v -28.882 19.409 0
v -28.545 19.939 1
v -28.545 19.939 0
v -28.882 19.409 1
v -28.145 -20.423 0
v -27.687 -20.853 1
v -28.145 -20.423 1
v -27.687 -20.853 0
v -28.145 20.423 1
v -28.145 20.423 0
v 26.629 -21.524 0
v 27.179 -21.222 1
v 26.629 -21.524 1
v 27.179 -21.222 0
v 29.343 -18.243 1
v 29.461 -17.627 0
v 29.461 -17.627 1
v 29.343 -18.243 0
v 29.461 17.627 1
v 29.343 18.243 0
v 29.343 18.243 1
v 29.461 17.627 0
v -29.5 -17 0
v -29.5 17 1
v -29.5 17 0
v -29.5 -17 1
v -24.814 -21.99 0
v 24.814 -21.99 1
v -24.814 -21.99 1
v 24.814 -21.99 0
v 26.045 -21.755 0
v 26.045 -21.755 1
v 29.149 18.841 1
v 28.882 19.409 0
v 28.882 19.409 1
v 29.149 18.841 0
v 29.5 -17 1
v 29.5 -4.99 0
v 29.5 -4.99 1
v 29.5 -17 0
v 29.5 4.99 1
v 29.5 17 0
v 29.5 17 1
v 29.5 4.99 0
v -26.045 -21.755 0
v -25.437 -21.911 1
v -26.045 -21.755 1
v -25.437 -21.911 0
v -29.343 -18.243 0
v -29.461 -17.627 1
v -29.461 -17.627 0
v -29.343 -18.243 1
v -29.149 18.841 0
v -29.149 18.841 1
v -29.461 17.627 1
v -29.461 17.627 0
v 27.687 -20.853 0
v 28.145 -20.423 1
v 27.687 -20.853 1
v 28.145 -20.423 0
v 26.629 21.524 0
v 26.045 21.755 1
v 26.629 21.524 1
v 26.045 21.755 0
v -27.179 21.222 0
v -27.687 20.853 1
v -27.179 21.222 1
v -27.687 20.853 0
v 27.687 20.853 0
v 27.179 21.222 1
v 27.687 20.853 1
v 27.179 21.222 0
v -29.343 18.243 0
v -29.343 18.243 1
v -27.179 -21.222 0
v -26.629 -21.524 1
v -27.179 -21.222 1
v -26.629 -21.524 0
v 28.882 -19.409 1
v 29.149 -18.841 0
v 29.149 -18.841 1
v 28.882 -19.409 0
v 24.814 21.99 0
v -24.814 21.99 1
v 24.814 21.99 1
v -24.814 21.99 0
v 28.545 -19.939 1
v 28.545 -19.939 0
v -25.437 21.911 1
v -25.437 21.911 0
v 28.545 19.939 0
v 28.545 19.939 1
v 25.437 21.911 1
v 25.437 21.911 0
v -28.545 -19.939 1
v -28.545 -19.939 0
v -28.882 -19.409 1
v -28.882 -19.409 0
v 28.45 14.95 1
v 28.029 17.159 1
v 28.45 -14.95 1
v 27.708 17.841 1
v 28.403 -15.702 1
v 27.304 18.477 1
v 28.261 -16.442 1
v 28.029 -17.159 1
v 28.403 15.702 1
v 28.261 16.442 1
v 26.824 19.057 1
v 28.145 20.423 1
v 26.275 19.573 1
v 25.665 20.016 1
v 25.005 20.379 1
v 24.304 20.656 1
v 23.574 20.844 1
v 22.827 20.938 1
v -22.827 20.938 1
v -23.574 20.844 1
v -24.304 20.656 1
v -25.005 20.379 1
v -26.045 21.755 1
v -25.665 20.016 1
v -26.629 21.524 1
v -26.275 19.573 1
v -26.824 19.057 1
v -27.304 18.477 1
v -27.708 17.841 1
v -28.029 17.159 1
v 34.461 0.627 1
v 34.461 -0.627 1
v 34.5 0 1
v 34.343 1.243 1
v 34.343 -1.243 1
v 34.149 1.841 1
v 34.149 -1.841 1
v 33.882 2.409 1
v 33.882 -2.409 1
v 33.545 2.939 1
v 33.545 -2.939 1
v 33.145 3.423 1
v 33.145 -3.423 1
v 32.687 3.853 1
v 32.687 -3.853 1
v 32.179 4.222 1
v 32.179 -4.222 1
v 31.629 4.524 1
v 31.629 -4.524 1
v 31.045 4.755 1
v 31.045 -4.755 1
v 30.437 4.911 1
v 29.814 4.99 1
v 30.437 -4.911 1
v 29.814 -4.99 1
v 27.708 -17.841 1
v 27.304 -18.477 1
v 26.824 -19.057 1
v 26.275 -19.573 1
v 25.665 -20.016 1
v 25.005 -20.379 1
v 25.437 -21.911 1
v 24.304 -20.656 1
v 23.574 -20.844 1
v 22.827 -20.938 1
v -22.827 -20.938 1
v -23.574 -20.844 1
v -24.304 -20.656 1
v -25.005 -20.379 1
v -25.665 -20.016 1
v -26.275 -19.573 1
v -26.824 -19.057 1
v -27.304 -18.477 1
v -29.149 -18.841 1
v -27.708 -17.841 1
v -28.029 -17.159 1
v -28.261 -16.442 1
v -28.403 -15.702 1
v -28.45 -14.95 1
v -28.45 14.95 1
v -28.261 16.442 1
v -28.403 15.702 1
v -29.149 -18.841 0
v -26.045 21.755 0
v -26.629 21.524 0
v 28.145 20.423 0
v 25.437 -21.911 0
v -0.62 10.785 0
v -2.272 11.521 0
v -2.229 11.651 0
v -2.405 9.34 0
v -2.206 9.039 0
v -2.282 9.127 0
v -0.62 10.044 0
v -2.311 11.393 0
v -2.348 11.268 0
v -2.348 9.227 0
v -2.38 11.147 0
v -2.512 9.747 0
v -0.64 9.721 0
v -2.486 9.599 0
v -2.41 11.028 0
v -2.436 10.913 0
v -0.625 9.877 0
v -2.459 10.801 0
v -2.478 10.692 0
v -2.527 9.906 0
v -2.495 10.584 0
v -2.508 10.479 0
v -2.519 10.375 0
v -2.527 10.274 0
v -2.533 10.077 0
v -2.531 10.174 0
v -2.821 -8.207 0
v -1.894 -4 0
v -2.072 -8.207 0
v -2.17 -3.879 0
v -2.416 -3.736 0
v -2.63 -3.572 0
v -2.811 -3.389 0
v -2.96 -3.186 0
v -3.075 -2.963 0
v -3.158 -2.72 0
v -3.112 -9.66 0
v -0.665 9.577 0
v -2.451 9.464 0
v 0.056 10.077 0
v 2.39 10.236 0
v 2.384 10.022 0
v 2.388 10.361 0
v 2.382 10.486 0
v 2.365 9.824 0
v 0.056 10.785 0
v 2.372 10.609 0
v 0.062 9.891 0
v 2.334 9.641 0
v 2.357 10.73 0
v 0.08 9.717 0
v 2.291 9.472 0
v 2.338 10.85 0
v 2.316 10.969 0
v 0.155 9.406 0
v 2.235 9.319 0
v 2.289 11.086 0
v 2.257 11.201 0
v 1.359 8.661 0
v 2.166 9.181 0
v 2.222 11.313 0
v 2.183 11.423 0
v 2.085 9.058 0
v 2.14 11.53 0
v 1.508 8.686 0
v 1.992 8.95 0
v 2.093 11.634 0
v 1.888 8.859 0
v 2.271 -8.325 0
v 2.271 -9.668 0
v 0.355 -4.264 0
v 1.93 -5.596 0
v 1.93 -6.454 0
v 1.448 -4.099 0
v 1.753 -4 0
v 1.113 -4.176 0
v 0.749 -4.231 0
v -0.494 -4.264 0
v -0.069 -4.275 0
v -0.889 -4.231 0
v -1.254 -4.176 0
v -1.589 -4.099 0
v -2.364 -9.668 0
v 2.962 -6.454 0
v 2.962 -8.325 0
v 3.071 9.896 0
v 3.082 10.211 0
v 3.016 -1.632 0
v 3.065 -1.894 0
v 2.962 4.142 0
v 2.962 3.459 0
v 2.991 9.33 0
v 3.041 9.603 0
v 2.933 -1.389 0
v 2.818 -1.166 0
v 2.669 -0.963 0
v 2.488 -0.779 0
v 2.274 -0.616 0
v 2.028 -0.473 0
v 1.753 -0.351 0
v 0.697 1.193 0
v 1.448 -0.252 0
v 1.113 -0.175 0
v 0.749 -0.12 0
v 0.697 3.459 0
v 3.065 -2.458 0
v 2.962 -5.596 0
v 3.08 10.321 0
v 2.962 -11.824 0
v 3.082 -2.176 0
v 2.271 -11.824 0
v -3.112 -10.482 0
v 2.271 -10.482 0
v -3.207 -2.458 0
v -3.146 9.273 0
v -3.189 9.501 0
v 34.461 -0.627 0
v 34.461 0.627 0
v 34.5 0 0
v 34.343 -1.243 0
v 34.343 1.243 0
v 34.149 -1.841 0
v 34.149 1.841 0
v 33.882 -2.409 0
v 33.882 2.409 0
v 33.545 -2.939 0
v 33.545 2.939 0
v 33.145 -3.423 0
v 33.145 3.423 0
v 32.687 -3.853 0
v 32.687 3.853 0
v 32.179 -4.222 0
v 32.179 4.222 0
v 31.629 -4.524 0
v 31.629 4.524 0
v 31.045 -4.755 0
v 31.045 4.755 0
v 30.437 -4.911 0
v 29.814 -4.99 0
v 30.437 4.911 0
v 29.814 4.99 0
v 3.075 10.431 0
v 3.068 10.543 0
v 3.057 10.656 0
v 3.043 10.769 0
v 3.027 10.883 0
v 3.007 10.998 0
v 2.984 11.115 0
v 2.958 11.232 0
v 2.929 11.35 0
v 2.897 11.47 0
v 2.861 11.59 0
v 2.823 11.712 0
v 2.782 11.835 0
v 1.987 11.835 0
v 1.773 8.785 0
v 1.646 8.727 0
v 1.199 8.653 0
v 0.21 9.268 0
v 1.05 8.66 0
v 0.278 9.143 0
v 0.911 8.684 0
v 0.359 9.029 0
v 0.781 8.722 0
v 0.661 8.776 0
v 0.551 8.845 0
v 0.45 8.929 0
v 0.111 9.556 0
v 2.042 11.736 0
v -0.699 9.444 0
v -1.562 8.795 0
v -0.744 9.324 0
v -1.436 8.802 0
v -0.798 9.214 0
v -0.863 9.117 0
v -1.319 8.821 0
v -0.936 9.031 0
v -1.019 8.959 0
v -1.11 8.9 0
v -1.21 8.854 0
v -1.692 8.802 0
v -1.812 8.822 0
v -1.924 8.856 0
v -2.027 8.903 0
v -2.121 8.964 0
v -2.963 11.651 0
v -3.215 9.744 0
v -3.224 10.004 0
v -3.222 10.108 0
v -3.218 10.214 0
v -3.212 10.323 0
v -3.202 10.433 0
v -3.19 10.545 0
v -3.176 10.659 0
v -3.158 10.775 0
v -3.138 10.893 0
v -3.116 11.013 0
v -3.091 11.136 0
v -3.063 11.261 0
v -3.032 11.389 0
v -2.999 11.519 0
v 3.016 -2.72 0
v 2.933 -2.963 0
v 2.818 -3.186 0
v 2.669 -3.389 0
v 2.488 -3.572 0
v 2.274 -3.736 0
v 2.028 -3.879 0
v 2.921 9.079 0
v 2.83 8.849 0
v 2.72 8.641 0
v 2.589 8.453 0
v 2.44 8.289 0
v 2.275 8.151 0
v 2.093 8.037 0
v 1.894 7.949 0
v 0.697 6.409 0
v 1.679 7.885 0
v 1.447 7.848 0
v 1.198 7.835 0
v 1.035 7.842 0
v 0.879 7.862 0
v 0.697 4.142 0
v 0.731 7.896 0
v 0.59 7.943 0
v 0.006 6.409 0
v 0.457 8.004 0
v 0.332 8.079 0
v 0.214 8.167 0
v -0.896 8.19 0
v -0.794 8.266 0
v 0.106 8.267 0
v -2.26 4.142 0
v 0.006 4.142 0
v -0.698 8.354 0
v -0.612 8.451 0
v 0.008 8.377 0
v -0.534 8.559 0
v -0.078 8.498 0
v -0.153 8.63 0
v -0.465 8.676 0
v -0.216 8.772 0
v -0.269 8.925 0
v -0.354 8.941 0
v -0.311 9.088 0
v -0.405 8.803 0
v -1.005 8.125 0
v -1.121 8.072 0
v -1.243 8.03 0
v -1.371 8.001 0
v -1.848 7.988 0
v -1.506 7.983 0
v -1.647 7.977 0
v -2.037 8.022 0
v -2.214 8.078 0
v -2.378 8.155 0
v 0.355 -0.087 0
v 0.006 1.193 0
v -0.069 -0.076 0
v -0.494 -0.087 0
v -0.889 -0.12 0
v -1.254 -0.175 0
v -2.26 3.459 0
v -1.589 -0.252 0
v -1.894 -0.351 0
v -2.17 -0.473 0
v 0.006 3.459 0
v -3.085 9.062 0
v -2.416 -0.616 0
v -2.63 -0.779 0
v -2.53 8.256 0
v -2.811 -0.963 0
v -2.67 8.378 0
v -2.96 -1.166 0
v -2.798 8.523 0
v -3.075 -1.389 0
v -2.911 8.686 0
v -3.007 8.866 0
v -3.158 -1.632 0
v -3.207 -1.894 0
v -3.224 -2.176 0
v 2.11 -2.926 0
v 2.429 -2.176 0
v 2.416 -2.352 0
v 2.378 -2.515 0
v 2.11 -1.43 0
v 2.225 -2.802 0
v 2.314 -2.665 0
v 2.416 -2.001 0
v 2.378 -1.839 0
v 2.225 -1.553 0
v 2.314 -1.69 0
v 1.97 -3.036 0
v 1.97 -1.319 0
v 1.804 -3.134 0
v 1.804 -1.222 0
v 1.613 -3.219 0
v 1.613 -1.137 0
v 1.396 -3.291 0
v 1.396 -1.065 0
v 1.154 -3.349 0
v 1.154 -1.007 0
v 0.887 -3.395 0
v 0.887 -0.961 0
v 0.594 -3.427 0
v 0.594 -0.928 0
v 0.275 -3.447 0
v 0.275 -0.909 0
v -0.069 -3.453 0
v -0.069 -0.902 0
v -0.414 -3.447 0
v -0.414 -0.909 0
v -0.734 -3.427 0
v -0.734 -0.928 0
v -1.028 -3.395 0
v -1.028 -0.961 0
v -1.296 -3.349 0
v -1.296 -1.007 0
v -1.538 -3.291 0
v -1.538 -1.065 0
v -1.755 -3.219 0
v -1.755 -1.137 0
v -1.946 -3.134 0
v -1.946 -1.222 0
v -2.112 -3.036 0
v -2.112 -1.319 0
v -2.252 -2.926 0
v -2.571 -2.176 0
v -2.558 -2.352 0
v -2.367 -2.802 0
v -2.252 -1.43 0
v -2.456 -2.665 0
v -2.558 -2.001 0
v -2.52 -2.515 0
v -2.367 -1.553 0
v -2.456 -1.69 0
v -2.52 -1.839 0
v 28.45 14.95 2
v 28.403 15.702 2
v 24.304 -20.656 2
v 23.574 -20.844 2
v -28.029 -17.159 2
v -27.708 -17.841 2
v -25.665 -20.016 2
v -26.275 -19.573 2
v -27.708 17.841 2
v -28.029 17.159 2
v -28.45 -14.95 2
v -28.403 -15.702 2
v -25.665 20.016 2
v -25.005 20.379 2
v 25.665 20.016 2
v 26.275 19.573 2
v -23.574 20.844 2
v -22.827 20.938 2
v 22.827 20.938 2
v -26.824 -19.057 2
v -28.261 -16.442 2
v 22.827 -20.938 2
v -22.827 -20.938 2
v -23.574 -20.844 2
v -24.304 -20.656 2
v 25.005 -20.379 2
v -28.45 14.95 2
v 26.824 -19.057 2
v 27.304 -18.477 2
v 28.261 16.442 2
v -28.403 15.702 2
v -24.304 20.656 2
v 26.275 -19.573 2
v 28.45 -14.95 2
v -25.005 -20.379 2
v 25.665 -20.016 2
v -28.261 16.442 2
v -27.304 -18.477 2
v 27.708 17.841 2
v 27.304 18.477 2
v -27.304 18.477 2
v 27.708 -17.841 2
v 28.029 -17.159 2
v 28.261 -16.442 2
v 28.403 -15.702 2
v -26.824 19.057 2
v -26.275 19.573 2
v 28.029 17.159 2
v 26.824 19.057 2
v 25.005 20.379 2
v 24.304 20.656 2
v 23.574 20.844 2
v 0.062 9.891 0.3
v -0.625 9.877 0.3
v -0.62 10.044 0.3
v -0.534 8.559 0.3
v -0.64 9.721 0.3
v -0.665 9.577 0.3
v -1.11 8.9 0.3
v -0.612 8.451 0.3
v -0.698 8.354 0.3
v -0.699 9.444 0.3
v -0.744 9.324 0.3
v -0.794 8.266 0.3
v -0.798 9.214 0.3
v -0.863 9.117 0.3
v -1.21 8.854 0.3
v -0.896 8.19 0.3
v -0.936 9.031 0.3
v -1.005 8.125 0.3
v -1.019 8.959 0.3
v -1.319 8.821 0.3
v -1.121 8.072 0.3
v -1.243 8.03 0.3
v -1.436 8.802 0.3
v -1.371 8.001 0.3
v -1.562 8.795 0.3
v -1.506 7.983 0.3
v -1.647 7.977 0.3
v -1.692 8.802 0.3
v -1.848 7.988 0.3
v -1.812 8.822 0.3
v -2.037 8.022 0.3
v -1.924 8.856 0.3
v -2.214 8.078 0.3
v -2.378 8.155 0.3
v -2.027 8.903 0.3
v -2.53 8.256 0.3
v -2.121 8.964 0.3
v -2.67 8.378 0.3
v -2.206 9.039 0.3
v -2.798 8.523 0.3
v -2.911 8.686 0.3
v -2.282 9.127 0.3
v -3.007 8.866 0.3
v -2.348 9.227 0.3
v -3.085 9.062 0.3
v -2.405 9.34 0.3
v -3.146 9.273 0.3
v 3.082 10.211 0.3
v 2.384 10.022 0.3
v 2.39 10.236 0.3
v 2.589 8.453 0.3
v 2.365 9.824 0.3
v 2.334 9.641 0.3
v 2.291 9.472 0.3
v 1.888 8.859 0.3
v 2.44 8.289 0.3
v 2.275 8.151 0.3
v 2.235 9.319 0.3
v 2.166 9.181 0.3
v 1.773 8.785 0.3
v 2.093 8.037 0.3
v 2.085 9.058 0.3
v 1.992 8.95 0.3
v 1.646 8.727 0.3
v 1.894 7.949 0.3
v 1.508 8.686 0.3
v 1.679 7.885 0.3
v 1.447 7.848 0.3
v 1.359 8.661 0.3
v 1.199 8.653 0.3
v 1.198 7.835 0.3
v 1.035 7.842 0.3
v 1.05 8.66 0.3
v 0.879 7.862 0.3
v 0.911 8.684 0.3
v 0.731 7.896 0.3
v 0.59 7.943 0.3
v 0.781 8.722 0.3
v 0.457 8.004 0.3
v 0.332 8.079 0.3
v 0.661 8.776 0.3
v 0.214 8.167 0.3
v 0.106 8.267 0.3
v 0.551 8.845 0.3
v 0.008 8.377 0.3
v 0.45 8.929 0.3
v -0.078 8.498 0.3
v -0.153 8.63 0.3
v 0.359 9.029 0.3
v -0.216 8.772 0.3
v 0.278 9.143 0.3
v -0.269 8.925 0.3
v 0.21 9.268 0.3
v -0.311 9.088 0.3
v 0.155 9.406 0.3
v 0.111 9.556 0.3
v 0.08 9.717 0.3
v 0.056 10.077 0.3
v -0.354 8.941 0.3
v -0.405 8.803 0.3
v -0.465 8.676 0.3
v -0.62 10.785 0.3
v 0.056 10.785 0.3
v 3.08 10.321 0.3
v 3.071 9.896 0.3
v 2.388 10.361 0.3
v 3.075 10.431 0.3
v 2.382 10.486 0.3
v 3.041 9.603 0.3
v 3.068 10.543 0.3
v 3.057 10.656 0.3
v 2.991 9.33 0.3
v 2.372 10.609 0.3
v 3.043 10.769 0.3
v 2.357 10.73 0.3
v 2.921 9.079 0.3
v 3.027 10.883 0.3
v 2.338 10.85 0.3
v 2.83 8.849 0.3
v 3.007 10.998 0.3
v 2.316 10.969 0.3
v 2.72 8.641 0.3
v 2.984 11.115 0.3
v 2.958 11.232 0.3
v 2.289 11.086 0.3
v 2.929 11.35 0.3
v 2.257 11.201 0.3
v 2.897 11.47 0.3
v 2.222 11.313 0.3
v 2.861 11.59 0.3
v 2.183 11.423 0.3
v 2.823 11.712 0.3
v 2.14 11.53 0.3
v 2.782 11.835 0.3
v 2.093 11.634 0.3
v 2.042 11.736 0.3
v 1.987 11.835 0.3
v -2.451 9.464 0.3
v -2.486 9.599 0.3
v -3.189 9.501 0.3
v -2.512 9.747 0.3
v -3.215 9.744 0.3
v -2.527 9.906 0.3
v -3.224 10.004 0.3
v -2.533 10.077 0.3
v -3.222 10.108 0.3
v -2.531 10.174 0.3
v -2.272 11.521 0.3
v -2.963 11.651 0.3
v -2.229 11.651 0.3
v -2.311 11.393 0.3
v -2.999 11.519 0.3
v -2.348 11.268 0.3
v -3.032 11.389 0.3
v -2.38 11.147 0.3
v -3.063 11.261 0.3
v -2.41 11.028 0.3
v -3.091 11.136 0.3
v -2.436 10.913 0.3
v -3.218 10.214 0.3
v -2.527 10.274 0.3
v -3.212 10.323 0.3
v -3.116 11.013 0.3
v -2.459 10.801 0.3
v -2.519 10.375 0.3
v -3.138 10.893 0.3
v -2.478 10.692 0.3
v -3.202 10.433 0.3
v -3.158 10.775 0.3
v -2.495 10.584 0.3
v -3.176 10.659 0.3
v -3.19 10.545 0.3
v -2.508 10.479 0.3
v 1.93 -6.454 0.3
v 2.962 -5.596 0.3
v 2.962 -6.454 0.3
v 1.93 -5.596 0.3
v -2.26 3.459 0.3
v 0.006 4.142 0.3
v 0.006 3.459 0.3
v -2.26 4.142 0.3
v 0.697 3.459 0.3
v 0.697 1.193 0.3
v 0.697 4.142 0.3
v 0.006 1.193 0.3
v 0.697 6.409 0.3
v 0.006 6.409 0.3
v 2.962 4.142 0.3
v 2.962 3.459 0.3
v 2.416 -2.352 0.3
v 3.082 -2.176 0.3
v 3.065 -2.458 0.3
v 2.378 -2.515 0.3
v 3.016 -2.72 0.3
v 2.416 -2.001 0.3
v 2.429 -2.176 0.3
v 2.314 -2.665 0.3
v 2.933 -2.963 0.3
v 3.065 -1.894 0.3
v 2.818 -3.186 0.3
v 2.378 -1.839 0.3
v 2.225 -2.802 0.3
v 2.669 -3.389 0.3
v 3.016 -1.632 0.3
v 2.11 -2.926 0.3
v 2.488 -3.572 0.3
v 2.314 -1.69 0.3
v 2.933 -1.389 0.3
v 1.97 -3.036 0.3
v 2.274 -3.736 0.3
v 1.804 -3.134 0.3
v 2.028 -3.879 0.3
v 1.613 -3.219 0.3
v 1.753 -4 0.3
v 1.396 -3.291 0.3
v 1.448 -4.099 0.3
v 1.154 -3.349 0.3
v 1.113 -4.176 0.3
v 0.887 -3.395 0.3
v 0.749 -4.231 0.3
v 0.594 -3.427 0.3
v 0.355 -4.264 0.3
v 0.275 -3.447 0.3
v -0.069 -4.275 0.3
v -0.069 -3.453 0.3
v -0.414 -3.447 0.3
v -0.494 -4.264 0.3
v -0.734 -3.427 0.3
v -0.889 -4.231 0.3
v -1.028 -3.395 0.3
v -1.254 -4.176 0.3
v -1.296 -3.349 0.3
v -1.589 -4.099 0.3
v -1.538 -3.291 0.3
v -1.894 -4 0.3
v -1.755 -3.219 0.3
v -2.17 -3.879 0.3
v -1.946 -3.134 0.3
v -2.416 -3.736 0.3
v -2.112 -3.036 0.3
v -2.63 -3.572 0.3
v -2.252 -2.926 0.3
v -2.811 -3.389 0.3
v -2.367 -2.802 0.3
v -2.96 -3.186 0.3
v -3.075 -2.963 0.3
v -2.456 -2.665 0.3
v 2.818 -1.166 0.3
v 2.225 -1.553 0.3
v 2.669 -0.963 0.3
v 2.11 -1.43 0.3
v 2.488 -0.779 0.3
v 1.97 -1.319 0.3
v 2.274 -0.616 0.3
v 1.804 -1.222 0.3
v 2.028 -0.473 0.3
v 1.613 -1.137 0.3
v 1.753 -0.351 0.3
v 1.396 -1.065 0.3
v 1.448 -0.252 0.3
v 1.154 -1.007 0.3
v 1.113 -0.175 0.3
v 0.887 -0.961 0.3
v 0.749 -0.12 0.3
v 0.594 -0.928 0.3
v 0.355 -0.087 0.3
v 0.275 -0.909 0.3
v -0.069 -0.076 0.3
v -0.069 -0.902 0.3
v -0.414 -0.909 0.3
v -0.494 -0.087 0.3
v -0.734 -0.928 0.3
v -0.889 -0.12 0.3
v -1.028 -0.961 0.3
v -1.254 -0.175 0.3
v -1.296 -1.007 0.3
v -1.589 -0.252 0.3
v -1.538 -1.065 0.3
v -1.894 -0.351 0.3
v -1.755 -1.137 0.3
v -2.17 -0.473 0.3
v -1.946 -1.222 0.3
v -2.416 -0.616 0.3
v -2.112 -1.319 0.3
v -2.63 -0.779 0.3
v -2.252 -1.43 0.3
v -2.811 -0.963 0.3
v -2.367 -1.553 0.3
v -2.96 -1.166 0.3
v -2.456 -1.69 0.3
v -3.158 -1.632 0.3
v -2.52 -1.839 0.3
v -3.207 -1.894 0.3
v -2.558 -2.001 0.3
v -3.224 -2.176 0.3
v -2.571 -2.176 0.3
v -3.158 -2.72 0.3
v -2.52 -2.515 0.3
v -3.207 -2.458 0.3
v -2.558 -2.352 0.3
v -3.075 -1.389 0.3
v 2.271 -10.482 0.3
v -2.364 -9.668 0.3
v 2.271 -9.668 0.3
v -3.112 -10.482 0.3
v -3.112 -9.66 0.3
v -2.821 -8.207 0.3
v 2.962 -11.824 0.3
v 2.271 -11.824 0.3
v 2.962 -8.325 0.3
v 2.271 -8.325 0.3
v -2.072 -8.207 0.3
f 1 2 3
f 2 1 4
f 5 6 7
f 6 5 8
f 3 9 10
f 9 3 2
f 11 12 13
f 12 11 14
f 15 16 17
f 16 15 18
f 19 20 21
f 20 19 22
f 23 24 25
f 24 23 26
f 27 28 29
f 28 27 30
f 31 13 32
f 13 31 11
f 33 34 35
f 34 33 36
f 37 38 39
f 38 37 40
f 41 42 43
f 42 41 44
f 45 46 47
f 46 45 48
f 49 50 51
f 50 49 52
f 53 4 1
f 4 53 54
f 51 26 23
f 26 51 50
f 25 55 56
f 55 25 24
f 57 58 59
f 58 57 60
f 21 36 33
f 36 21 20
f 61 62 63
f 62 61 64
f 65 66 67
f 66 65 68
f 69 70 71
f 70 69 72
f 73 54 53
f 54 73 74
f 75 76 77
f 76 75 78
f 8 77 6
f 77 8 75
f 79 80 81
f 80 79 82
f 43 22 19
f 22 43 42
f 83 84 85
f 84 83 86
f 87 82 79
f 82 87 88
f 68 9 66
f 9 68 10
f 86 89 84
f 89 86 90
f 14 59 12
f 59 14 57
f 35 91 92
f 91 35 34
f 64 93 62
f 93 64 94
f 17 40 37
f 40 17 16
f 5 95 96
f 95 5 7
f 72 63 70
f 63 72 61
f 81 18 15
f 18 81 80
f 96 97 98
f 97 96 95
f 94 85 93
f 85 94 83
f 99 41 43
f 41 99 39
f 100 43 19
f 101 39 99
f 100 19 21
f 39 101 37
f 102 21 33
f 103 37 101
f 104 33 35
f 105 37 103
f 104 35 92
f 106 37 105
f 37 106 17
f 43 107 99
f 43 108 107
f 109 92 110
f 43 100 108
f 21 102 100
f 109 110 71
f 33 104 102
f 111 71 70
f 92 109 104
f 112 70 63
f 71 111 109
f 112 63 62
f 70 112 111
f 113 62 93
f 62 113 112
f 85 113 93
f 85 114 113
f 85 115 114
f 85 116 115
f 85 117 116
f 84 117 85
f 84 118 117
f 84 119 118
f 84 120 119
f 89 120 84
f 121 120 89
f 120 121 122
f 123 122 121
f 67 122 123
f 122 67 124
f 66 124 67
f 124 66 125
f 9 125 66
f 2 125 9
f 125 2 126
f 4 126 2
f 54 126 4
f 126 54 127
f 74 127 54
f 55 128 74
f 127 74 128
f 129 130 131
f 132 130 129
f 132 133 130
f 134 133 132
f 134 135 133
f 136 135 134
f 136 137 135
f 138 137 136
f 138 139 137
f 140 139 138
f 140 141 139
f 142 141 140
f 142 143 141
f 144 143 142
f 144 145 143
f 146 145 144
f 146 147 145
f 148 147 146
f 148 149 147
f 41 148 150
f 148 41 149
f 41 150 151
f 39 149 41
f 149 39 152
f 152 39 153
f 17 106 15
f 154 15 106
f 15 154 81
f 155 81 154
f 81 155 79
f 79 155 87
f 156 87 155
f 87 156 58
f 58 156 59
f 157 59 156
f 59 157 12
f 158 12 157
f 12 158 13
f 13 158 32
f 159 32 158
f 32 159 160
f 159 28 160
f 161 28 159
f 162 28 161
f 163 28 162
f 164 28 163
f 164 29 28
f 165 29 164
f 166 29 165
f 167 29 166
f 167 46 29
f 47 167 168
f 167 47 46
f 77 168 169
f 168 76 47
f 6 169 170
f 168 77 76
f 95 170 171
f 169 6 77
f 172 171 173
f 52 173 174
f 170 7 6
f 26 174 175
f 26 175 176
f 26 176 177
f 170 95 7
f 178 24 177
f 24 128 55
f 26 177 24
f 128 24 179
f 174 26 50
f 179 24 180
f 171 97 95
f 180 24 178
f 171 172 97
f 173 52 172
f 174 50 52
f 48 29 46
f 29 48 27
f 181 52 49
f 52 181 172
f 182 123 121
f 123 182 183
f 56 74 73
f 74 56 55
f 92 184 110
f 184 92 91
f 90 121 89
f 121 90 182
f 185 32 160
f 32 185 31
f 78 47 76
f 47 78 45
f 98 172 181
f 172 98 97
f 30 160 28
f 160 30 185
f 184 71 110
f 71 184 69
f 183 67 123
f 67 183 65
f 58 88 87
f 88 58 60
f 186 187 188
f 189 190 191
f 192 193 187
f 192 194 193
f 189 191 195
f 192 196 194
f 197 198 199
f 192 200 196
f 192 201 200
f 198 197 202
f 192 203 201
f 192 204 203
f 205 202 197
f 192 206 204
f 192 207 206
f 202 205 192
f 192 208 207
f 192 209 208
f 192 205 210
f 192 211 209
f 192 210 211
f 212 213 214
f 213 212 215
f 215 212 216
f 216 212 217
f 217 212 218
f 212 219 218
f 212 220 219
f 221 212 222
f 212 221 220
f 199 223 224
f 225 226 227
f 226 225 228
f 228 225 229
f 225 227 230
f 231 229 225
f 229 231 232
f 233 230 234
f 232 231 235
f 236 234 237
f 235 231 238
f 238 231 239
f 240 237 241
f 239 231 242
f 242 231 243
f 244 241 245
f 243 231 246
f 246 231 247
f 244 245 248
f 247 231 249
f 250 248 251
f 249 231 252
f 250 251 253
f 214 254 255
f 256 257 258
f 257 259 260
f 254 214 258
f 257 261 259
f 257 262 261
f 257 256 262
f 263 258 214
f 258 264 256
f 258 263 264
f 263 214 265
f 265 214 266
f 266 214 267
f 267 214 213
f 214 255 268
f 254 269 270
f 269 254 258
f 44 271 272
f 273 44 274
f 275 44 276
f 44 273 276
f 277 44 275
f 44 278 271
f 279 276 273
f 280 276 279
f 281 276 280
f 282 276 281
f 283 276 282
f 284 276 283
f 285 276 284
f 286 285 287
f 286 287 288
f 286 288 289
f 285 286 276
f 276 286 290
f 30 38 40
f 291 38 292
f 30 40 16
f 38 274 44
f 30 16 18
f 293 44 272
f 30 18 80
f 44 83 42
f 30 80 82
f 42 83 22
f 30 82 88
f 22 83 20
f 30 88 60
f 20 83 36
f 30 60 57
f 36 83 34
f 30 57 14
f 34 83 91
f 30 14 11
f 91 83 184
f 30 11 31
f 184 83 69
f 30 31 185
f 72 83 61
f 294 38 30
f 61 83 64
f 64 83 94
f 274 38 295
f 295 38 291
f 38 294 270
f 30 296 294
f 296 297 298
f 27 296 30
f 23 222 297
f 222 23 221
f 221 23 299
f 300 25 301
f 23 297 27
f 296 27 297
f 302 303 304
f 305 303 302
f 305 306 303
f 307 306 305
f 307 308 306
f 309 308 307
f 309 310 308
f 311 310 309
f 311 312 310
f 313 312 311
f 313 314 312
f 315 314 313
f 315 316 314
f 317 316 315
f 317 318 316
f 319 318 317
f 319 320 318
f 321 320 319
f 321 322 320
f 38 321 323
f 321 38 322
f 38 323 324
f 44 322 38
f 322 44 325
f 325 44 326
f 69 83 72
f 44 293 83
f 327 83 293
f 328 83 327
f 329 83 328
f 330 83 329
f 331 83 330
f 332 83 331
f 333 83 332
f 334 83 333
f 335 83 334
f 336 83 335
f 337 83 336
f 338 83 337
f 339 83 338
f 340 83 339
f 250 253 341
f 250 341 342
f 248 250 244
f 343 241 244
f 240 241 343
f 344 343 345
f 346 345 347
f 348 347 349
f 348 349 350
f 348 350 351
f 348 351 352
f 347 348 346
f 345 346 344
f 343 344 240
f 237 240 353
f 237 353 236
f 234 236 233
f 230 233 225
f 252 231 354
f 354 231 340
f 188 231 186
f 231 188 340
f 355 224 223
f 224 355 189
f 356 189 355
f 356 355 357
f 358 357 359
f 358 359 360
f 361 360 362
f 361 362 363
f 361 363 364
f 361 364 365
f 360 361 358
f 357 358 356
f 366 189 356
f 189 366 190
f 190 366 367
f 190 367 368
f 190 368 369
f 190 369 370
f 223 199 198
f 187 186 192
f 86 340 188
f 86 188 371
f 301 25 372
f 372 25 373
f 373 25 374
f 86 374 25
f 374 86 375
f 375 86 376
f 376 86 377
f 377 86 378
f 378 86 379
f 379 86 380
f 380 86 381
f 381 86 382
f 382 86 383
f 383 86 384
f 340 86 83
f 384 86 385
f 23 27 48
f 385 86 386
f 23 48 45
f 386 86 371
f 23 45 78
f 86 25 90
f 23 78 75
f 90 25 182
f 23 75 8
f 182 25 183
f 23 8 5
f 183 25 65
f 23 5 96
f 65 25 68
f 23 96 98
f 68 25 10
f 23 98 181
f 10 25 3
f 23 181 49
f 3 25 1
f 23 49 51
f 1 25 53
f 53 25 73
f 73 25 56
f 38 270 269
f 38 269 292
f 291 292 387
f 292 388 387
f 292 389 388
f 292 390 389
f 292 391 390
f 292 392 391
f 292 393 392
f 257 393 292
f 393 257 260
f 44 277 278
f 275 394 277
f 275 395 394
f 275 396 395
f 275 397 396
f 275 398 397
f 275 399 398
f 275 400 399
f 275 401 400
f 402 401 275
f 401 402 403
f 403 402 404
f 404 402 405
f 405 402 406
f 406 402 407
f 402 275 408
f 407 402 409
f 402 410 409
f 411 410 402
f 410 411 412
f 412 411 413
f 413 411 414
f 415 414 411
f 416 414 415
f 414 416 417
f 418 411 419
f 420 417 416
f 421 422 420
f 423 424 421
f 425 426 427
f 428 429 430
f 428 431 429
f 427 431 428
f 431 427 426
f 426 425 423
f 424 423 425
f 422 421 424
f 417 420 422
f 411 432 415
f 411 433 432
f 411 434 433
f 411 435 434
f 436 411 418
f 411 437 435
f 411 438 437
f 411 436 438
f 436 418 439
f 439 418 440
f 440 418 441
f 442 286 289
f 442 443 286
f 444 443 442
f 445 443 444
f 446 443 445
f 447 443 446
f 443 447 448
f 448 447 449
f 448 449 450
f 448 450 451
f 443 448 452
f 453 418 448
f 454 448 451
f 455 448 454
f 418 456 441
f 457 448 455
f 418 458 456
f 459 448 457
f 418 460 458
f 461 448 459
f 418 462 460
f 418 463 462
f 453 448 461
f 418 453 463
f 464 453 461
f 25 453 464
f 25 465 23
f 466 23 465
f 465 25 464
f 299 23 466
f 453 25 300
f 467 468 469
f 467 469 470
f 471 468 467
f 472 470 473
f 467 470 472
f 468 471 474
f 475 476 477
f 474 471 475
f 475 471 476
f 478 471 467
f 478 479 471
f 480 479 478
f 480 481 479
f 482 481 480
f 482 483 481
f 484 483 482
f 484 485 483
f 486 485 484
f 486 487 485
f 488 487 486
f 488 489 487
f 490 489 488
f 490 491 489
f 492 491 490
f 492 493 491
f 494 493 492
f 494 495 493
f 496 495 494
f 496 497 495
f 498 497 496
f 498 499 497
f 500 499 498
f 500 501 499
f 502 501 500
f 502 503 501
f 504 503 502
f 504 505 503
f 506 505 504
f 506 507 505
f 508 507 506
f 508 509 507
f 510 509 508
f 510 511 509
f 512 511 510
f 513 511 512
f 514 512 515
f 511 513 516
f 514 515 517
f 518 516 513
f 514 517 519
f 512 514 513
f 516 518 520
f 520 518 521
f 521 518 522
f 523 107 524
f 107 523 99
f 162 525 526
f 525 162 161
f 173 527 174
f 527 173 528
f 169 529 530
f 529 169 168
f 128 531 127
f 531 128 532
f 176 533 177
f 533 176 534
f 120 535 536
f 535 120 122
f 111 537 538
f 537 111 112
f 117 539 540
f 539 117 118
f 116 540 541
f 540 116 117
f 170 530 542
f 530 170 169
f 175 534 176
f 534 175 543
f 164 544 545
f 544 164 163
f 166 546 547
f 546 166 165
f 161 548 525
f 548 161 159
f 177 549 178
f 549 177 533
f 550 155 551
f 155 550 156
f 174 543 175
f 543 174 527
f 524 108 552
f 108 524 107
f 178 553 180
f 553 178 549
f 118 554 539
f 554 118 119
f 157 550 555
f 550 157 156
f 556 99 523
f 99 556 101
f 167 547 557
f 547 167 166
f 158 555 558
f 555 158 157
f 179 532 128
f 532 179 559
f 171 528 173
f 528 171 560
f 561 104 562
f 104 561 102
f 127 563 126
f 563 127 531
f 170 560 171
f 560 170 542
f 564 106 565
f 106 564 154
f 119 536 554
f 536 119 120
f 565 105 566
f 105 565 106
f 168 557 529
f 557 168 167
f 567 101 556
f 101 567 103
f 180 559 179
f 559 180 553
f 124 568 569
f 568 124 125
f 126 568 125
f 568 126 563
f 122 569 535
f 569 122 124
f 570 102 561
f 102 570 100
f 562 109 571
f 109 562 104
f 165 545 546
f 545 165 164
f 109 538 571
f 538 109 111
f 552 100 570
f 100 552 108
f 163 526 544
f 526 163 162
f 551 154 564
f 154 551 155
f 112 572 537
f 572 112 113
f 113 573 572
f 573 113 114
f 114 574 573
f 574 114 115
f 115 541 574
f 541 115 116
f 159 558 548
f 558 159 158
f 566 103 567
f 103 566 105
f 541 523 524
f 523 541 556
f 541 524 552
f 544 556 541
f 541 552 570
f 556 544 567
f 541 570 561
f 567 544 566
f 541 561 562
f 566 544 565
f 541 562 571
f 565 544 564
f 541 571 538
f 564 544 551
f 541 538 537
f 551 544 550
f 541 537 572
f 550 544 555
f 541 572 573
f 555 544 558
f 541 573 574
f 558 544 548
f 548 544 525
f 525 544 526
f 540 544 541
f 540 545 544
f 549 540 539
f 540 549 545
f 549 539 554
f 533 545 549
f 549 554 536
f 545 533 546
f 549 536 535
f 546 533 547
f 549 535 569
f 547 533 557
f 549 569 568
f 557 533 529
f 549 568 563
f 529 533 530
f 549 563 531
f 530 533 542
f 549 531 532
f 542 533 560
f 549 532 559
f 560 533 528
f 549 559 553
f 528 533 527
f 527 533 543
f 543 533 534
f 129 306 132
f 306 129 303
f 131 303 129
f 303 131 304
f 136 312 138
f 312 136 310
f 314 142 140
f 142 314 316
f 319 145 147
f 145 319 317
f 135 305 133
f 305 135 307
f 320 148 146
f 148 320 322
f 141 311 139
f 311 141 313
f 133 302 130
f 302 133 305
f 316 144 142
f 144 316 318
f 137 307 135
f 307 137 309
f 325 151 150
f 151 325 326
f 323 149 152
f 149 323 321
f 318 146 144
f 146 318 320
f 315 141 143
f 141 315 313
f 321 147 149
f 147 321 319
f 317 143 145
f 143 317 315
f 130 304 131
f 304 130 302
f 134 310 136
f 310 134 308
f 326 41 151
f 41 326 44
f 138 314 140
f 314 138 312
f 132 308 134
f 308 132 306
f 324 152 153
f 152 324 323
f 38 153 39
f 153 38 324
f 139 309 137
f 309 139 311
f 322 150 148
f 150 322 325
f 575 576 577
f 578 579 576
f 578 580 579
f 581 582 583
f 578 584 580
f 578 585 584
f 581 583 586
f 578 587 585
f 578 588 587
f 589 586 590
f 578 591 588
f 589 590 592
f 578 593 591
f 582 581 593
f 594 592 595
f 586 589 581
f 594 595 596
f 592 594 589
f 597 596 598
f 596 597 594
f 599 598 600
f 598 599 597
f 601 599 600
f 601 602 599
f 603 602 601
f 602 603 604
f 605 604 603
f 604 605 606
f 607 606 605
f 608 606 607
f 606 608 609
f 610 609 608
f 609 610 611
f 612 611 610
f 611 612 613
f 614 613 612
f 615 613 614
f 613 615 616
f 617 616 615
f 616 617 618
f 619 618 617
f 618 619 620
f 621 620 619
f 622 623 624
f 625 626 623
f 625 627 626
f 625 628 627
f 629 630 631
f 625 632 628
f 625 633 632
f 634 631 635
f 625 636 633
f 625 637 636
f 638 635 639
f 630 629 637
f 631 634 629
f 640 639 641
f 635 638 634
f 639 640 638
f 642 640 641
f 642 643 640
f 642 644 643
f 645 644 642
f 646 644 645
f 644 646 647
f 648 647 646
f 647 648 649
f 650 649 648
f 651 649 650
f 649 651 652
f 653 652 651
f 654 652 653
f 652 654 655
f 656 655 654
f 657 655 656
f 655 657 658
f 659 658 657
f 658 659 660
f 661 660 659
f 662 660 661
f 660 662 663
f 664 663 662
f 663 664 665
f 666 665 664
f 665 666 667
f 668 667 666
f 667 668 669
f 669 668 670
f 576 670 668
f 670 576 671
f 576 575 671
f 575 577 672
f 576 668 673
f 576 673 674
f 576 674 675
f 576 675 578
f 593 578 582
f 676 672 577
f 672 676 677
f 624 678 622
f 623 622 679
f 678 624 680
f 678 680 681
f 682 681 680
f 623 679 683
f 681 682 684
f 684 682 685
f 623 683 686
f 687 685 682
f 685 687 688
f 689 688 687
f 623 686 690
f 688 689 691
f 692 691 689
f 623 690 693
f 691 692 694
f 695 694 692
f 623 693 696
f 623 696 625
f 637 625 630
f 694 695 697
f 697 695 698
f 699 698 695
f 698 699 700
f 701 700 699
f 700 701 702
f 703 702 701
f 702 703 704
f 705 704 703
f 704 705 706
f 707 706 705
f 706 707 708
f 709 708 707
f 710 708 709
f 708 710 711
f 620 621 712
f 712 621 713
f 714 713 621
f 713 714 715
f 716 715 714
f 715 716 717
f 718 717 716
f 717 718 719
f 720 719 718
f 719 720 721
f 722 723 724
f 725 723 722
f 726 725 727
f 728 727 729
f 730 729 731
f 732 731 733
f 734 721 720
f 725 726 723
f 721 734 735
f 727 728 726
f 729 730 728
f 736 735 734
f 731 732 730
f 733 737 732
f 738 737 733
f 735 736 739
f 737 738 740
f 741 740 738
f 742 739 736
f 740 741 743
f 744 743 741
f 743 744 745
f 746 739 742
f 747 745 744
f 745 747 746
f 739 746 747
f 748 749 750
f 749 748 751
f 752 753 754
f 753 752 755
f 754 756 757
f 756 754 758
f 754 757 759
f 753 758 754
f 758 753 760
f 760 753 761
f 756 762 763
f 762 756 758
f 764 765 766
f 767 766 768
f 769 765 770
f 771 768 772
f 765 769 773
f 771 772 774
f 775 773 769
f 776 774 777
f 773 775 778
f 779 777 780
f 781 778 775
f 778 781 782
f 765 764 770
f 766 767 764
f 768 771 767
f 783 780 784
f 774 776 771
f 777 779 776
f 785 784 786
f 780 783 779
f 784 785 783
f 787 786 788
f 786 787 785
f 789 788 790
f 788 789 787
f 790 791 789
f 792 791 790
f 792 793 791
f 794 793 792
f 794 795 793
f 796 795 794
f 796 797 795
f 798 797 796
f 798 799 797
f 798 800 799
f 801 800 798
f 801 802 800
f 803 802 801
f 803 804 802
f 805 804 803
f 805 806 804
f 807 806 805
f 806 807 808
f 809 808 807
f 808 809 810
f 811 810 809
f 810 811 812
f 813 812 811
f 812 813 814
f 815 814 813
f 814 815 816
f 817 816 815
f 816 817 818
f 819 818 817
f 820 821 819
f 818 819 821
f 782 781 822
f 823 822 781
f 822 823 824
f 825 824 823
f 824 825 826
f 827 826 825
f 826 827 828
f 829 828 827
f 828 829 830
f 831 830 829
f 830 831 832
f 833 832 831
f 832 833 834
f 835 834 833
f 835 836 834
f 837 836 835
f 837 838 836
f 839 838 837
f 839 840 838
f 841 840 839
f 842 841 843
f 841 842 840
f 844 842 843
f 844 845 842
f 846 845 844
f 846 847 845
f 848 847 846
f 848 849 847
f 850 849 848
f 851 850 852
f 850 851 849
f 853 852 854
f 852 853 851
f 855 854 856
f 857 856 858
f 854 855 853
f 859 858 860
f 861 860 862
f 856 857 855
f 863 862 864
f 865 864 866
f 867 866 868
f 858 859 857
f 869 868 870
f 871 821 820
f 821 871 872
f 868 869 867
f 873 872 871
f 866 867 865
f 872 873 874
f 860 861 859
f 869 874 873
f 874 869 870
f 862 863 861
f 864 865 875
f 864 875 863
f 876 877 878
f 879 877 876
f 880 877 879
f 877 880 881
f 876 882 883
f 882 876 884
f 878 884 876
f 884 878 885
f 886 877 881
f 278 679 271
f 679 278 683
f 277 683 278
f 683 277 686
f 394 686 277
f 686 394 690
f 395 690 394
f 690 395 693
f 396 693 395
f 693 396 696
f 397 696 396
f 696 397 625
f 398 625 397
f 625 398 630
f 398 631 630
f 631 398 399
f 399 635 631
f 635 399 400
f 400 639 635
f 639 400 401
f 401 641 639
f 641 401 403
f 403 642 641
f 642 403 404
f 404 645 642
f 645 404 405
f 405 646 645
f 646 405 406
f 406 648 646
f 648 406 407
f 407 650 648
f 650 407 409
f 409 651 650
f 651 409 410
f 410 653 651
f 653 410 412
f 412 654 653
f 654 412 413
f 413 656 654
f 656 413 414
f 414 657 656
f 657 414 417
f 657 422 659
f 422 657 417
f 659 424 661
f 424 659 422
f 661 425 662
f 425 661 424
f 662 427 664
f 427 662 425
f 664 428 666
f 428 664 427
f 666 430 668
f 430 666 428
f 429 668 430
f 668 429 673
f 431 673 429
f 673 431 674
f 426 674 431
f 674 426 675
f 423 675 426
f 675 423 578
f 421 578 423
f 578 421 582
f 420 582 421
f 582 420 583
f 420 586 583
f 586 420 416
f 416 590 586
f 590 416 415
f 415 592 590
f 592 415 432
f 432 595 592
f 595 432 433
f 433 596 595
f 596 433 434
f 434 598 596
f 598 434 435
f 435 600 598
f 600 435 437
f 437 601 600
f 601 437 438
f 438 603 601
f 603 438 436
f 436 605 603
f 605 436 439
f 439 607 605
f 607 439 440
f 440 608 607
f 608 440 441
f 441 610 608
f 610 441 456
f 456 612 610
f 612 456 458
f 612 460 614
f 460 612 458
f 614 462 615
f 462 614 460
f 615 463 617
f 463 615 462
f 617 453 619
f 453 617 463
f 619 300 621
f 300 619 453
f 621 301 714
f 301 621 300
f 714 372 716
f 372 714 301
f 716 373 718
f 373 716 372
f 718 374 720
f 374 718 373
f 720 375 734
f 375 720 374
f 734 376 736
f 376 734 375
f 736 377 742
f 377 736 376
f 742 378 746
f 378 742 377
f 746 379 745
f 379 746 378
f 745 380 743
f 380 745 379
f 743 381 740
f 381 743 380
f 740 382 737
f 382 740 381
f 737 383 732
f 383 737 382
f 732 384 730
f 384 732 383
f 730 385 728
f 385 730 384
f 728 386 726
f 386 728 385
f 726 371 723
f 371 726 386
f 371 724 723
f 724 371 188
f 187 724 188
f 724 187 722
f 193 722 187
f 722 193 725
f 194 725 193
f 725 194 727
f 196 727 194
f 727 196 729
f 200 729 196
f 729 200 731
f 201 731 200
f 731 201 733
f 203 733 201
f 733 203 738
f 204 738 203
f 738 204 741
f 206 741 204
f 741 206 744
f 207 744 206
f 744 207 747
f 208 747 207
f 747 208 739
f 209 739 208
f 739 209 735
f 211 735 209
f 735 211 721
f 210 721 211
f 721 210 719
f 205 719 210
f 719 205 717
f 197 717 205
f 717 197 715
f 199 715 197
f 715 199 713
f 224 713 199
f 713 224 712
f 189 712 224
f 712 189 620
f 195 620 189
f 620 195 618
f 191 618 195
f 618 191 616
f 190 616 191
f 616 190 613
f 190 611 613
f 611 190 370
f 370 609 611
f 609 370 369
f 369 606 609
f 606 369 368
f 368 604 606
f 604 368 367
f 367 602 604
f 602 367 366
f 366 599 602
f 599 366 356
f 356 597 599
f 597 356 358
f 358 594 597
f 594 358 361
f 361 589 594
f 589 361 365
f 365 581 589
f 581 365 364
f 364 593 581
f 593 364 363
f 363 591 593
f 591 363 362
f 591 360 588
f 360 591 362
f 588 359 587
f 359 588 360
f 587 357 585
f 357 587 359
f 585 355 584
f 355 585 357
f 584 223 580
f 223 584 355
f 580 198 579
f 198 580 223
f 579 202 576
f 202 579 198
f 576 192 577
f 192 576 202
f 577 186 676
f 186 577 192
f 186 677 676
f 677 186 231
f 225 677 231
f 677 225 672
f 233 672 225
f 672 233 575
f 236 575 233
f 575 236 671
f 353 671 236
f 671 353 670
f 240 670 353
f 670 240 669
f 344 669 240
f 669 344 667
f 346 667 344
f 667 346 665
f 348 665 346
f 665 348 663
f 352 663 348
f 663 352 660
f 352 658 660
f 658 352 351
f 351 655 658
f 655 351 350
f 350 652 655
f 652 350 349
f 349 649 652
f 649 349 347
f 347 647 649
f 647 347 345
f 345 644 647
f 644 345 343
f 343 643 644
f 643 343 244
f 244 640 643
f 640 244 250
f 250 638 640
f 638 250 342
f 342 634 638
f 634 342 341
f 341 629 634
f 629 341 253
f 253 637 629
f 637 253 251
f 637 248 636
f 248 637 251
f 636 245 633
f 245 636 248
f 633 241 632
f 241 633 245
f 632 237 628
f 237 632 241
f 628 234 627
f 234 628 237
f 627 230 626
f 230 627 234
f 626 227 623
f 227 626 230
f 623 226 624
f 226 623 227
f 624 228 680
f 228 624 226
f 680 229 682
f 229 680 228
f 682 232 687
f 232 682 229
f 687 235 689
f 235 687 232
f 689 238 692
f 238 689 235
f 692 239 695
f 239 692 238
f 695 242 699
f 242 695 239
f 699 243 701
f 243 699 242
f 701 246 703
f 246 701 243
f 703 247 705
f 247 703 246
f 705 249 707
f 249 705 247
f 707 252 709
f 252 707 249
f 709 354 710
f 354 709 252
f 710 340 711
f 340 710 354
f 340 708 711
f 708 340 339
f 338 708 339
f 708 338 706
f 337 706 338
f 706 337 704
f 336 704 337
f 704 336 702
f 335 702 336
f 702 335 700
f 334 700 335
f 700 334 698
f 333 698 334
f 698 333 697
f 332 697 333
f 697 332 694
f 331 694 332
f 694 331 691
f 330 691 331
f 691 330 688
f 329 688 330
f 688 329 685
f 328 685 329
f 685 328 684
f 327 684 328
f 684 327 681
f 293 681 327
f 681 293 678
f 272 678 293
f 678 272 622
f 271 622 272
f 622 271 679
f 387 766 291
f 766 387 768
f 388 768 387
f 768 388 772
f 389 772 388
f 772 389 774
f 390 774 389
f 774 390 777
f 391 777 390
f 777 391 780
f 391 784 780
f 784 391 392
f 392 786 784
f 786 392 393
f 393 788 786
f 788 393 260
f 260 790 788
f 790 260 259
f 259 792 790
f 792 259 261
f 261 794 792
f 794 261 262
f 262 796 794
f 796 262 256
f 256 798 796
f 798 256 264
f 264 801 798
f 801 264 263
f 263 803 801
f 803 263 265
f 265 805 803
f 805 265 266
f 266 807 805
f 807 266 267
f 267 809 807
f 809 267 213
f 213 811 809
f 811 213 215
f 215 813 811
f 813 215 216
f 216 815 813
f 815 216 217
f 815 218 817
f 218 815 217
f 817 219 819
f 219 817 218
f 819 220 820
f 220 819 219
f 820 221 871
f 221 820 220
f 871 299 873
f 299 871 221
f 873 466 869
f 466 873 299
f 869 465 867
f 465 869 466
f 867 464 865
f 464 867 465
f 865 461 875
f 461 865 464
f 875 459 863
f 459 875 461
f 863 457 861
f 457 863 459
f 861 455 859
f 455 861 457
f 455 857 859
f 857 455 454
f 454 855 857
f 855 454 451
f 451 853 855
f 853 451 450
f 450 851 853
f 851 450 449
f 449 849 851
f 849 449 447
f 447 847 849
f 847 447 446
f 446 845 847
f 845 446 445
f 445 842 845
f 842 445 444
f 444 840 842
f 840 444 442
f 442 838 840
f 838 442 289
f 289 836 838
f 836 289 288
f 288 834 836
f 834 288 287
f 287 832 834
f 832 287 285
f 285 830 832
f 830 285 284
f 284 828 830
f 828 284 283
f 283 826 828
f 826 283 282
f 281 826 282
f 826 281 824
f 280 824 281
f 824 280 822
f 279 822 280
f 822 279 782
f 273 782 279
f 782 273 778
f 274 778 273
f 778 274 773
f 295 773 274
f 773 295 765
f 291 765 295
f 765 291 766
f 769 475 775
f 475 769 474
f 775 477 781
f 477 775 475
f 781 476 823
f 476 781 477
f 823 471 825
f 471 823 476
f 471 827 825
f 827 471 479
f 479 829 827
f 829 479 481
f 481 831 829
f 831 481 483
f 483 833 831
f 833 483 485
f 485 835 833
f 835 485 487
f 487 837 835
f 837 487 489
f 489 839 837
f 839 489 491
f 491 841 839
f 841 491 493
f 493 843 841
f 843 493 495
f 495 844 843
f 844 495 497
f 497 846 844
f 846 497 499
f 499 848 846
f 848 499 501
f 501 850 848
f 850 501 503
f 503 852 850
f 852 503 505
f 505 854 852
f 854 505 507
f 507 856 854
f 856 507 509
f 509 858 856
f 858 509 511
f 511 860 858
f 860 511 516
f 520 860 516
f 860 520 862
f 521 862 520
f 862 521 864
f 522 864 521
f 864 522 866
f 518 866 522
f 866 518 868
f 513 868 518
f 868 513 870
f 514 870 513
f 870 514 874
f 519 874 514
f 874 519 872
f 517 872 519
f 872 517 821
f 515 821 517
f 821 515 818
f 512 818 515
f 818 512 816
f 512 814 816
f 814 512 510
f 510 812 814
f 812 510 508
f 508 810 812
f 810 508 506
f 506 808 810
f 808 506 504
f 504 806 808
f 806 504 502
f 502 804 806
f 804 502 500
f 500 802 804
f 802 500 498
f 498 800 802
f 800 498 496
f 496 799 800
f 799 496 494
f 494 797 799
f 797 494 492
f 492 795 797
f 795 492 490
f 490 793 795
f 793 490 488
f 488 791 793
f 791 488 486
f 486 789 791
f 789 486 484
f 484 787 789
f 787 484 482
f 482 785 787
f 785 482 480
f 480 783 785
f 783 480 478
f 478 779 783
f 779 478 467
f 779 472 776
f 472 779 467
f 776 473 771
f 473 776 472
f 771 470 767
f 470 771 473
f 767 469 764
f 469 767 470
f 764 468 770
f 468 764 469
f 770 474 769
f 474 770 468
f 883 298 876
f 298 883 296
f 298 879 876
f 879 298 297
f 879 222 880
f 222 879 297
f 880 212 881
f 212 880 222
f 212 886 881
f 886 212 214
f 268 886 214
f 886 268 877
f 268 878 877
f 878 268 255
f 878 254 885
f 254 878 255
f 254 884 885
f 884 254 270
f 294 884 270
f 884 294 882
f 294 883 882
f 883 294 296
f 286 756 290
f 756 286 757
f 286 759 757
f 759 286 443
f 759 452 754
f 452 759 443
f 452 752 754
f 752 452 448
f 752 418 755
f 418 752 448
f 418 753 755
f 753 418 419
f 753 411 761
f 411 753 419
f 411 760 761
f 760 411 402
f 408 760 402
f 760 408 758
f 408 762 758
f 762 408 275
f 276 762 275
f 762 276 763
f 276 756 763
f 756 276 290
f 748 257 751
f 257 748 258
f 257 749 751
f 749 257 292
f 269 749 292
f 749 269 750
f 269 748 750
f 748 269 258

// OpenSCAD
$fn = 50;


difference() {
	union() {
		translate(v = [0, 0, 0]) {
			rotate(a = [0, 0, 0]) {
				hull() {
					translate(v = [-24.5000000000, 17.0000000000, 0]) {
						rotate(a = [0, 0, 0]) {
							translate(v = [0, 0, 0]) {
								rotate(a = [0, 0, 0]) {
									cylinder(h = 1, r = 5);
								}
							}
						}
					}
					translate(v = [24.5000000000, 17.0000000000, 0]) {
						rotate(a = [0, 0, 0]) {
							translate(v = [0, 0, 0]) {
								rotate(a = [0, 0, 0]) {
									cylinder(h = 1, r = 5);
								}
							}
						}
					}
					translate(v = [-24.5000000000, -17.0000000000, 0]) {
						rotate(a = [0, 0, 0]) {
							translate(v = [0, 0, 0]) {
								rotate(a = [0, 0, 0]) {
									cylinder(h = 1, r = 5);
								}
							}
						}
					}
					translate(v = [24.5000000000, -17.0000000000, 0]) {
						rotate(a = [0, 0, 0]) {
							translate(v = [0, 0, 0]) {
								rotate(a = [0, 0, 0]) {
									cylinder(h = 1, r = 5);
								}
							}
						}
					}
				}
			}
		}
		translate(v = [0, 0, 0]) {
			rotate(a = [0, 0, 0]) {
				hull() {
					translate(v = [-22.4500000000, 14.9500000000, 0]) {
						rotate(a = [0, 0, 0]) {
							translate(v = [0, 0, 0]) {
								rotate(a = [0, 0, 0]) {
									cylinder(h = 2, r = 6);
								}
							}
						}
					}
					translate(v = [22.4500000000, 14.9500000000, 0]) {
						rotate(a = [0, 0, 0]) {
							translate(v = [0, 0, 0]) {
								rotate(a = [0, 0, 0]) {
									cylinder(h = 2, r = 6);
								}
							}
						}
					}
					translate(v = [-22.4500000000, -14.9500000000, 0]) {
						rotate(a = [0, 0, 0]) {
							translate(v = [0, 0, 0]) {
								rotate(a = [0, 0, 0]) {
									cylinder(h = 2, r = 6);
								}
							}
						}
					}
					translate(v = [22.4500000000, -14.9500000000, 0]) {
						rotate(a = [0, 0, 0]) {
							translate(v = [0, 0, 0]) {
								rotate(a = [0, 0, 0]) {
									cylinder(h = 2, r = 6);
								}
							}
						}
					}
				}
			}
		}
		translate(v = [29.5000000000, 0, 0.0000000000]) {
			rotate(a = [0, 0, 0]) {
				cylinder(h = 1, r = 5);
			}
		}
	}
	union() {
		translate(v = [0, 0, 0.3000000000]) {
			rotate(a = [0, 180, 90]) {
				linear_extrude(height = 0.3000000000) {
					text(font = "Candara:Light", halign = "center", size = 6, text = "3+0.1", valign = "center");
				}
			}
		}
	}
}
